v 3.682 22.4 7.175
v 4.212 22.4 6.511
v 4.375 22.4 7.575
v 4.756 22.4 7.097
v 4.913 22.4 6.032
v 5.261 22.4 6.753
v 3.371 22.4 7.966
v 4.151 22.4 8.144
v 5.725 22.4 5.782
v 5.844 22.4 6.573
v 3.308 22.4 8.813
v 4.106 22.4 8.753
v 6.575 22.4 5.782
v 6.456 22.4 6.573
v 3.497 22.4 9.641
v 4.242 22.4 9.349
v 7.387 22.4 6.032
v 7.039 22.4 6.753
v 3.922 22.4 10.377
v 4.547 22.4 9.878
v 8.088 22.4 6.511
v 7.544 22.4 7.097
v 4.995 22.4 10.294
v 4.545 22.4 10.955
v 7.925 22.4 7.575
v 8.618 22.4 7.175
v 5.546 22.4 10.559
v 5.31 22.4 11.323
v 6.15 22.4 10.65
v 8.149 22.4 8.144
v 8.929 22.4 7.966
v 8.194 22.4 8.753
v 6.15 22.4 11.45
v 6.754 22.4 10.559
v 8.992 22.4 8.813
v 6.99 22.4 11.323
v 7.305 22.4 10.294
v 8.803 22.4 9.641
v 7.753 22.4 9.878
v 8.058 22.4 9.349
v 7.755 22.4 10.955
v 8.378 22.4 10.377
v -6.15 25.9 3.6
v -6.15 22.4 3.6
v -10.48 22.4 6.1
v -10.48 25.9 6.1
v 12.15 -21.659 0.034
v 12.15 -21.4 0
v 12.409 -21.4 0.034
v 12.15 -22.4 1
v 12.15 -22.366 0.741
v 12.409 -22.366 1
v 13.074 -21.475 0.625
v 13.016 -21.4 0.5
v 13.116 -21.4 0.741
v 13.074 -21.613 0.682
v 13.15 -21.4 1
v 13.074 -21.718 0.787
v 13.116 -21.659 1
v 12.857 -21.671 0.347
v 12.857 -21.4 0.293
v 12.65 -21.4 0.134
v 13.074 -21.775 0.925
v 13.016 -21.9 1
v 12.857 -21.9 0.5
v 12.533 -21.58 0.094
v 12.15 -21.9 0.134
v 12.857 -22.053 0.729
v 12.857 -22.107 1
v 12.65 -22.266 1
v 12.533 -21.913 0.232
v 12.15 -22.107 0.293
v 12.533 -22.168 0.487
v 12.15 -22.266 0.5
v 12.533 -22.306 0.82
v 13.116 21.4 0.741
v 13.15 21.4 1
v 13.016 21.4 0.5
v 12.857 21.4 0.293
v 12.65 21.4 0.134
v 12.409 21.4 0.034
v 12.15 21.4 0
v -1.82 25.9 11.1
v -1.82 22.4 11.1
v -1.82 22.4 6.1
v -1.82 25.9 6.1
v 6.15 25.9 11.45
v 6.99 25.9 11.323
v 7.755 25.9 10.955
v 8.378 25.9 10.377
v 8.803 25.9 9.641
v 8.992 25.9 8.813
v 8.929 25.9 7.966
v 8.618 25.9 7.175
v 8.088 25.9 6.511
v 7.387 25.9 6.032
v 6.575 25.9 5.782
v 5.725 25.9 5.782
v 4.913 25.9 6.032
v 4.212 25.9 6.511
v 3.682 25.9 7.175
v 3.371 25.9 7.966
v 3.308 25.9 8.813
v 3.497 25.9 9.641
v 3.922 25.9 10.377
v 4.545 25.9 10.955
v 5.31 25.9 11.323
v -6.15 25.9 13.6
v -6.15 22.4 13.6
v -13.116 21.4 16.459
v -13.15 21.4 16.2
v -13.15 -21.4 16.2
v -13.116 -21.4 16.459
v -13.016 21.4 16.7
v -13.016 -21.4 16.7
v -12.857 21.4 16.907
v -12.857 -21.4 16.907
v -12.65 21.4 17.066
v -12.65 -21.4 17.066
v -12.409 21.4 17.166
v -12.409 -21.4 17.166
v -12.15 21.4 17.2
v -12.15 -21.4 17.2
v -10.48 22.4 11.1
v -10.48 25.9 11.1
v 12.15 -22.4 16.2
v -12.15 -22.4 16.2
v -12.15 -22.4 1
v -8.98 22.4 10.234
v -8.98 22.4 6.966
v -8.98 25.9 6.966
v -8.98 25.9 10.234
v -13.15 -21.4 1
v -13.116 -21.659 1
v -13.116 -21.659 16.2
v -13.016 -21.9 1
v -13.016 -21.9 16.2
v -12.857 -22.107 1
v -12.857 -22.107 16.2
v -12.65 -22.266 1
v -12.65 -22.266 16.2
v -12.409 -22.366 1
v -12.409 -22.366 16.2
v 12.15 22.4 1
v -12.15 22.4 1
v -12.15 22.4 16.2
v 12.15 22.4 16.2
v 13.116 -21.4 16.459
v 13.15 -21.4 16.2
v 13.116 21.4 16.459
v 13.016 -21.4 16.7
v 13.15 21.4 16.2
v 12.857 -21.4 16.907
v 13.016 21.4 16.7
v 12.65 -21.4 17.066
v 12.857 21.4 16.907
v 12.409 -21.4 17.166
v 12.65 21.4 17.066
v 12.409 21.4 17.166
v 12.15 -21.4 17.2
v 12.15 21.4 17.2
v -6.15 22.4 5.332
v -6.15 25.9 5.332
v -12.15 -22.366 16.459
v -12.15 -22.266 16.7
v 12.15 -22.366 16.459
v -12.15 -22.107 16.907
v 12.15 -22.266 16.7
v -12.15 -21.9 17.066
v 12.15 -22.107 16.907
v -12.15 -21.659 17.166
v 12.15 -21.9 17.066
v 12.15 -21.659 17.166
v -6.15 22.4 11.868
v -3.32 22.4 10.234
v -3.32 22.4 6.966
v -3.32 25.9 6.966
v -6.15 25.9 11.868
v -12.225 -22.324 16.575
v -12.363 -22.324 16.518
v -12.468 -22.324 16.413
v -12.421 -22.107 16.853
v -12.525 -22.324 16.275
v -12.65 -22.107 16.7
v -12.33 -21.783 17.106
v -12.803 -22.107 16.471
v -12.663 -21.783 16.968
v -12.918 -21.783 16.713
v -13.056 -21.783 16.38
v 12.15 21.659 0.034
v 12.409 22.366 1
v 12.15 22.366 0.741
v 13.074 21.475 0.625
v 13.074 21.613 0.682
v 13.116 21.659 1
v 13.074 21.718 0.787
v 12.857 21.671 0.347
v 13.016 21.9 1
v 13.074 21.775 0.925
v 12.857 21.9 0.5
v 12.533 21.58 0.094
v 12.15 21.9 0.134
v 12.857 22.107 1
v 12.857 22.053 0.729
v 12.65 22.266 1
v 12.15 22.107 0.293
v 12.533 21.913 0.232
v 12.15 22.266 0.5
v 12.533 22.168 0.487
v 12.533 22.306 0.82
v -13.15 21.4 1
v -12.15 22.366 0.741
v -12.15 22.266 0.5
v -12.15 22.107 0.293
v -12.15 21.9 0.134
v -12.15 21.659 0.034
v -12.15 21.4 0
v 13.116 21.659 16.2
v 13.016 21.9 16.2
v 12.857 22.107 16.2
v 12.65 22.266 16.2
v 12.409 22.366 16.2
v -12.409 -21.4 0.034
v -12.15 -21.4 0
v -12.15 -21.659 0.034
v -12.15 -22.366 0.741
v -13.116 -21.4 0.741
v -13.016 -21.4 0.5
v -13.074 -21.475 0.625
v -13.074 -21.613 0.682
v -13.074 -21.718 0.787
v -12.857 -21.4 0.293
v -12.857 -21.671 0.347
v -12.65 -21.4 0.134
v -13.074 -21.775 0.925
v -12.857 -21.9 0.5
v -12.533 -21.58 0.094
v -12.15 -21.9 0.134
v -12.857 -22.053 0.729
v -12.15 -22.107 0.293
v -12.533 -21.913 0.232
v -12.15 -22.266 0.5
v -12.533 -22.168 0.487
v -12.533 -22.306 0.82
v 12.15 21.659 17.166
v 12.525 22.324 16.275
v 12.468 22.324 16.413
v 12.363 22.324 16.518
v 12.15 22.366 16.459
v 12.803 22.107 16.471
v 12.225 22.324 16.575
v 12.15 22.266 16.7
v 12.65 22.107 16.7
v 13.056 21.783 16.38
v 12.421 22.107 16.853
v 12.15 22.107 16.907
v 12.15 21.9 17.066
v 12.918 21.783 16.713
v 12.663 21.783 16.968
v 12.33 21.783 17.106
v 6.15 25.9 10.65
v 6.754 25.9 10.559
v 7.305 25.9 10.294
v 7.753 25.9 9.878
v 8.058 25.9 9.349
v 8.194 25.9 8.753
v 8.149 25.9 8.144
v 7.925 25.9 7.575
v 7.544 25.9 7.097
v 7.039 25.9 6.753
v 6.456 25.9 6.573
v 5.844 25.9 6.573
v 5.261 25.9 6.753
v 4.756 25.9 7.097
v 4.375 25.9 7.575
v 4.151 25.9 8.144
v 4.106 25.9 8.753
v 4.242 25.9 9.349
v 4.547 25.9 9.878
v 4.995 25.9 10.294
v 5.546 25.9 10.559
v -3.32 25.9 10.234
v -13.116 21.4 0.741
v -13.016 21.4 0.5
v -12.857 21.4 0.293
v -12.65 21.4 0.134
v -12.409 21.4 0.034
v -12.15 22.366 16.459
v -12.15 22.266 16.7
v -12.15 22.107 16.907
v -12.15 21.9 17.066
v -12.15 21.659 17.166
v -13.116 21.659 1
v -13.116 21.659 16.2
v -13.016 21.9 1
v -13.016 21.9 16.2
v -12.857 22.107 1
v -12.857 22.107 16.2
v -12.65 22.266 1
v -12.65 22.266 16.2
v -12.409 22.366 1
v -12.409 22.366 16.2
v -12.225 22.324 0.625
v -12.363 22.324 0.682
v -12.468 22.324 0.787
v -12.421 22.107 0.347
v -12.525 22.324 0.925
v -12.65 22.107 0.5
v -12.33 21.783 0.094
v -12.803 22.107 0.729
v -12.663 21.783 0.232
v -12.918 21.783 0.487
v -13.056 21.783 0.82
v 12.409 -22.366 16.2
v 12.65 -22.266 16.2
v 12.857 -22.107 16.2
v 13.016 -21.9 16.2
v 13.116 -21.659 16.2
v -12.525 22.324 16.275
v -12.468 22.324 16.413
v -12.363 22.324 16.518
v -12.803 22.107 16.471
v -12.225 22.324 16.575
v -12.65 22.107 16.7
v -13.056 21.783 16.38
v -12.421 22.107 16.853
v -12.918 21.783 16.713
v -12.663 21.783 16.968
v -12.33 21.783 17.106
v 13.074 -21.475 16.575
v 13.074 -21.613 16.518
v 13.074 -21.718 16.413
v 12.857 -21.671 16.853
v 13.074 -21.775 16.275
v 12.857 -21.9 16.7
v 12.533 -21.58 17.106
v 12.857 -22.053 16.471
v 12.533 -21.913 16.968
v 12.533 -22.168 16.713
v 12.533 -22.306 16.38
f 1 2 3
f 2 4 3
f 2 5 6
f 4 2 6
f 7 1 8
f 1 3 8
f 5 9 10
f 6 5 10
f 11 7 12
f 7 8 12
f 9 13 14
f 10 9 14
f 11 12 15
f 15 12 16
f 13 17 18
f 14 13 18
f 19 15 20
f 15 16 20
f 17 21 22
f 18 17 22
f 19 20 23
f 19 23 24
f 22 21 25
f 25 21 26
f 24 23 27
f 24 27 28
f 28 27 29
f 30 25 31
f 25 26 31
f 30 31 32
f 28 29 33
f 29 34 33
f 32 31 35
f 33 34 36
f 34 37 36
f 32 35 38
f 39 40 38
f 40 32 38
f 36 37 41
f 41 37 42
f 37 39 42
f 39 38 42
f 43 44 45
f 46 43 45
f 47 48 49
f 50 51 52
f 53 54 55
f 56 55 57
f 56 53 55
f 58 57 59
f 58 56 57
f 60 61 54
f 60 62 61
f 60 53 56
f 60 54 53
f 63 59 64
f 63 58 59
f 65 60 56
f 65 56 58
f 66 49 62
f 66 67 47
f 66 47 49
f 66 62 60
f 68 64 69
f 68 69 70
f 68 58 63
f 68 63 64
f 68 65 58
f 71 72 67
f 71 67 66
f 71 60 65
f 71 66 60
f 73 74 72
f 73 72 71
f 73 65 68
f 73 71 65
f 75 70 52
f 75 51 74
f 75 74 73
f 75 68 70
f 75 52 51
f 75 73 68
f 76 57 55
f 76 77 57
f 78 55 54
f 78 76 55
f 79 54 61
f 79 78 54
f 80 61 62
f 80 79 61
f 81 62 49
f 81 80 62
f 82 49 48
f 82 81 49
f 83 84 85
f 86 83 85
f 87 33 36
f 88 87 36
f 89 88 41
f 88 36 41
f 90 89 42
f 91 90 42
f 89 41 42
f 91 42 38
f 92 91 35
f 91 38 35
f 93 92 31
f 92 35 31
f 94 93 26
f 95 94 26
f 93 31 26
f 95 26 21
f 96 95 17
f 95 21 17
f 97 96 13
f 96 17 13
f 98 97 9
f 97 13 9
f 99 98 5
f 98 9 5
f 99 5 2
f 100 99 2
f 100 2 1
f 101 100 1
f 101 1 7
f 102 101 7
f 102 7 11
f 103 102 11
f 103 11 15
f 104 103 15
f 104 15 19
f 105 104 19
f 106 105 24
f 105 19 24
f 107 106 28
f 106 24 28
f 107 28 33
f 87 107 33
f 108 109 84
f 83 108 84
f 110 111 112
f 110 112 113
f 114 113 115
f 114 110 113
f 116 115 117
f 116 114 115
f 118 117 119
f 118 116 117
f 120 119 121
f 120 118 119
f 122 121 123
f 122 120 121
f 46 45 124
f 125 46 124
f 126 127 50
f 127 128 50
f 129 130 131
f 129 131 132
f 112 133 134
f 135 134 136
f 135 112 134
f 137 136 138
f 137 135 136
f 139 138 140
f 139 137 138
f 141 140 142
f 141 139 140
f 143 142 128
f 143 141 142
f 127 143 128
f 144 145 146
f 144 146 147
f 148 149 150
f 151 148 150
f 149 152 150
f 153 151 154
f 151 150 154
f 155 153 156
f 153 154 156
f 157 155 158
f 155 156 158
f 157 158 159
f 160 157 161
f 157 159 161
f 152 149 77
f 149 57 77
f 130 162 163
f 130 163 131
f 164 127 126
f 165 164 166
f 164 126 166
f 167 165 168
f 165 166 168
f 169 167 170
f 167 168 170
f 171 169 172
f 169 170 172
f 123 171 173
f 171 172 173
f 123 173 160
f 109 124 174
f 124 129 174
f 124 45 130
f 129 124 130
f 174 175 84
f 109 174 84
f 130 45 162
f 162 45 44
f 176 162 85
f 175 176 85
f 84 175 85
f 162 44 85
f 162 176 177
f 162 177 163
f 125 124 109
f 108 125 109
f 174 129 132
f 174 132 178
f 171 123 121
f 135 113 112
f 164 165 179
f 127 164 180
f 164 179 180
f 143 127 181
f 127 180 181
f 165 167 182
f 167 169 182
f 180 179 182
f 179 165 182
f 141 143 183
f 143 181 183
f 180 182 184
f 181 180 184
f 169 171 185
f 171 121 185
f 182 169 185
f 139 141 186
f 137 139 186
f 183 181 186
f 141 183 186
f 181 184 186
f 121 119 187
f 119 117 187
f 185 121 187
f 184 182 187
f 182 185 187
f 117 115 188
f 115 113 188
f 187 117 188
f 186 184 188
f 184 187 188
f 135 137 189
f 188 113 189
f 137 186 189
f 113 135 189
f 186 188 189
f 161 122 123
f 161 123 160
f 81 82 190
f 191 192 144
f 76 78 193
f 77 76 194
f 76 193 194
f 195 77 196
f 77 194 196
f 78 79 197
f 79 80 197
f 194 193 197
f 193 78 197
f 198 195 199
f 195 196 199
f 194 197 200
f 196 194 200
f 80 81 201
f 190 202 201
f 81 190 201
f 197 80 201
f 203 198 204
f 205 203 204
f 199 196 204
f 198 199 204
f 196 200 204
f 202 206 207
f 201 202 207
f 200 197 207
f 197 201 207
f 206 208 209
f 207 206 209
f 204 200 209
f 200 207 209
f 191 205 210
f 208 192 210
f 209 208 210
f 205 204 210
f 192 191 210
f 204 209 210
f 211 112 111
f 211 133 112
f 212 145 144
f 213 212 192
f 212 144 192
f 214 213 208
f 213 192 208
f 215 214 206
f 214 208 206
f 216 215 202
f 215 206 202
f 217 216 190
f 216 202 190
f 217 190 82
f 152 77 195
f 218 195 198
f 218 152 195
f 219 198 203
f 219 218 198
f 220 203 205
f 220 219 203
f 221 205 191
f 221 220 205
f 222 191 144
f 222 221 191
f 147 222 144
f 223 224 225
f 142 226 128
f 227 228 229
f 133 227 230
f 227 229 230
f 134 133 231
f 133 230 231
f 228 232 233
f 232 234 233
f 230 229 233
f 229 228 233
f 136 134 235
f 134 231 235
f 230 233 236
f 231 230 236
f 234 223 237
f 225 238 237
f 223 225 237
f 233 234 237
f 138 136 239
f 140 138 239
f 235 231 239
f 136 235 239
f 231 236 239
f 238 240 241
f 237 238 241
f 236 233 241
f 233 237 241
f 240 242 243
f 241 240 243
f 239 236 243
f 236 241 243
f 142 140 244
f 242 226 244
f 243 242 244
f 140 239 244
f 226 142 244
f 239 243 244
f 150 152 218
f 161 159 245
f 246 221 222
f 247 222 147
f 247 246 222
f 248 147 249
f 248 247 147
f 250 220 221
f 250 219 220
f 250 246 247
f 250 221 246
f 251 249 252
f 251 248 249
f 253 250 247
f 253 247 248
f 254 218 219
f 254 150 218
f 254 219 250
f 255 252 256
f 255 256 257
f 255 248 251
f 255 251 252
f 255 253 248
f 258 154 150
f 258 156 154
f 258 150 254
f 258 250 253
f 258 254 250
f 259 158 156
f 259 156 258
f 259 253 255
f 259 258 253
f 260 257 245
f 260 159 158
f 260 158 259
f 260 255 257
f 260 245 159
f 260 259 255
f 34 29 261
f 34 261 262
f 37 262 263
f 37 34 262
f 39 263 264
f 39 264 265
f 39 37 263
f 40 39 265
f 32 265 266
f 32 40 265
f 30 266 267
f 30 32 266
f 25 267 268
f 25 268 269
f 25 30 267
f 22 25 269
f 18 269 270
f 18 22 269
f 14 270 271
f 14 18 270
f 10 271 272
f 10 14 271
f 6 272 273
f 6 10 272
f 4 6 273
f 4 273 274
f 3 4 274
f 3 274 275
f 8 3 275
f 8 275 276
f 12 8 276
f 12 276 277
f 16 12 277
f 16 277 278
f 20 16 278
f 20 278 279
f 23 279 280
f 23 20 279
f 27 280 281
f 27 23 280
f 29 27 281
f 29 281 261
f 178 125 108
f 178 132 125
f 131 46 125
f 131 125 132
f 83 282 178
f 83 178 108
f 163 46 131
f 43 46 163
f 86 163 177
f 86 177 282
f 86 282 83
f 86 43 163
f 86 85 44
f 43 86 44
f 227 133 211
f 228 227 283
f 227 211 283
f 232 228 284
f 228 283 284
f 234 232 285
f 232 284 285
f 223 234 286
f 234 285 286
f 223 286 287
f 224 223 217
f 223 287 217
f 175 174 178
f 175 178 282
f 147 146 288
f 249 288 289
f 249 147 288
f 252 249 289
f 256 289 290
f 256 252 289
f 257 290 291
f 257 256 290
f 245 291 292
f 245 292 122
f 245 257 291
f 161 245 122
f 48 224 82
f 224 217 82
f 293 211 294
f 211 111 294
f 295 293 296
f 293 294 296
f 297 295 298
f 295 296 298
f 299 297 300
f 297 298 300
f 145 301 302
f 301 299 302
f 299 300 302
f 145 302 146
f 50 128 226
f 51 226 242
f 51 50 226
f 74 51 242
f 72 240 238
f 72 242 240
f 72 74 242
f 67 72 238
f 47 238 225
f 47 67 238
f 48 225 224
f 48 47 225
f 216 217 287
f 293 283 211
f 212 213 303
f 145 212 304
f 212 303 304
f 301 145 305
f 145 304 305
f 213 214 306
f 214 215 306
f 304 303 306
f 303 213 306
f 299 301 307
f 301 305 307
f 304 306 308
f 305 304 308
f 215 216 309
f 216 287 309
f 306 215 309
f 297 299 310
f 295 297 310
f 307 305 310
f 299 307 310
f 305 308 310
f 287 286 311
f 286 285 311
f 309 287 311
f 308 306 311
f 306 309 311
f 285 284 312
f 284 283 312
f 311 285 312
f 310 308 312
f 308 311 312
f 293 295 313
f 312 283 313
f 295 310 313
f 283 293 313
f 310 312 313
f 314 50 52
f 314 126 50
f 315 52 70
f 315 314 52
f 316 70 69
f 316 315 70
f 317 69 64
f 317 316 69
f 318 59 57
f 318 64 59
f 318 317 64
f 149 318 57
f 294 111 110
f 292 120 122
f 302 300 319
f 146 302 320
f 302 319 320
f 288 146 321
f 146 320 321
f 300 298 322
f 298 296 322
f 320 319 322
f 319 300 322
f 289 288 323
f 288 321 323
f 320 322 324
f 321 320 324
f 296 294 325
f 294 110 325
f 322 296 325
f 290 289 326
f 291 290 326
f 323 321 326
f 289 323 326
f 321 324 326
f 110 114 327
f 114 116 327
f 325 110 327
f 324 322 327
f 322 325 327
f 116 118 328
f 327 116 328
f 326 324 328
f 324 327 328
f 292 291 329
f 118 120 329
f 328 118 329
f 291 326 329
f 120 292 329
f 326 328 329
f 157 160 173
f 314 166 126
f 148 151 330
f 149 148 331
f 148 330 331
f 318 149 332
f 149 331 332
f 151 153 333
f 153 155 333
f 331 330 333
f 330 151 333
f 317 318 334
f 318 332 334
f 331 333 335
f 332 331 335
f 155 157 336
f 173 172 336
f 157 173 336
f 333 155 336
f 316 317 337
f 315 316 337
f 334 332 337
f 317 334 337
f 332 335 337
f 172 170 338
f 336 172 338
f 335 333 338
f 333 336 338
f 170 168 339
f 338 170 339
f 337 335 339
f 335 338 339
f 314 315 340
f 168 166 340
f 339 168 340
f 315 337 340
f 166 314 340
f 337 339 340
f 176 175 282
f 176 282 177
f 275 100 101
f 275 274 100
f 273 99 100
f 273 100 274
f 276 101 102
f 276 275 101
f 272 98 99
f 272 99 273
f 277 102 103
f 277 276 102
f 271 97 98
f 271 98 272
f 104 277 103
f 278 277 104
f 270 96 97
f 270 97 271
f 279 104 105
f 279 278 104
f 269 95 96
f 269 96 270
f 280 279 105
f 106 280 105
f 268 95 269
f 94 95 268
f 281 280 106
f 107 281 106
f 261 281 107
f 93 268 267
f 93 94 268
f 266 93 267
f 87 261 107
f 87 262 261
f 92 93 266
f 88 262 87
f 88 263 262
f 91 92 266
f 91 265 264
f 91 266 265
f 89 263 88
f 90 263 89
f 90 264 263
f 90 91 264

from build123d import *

# Parameters (mm, degrees)
CROQUIS1_W                = 26.3
CROQUIS1_H                = 44.8
SALIENTE_EXTRUIR1_DEPTH   = 17.2
REDONDEO1_R               = 1
CROQUIS3_R                = 2.85
CROQUIS3_R_2              = 2.05
SALIENTE_EXTRUIR2_DEPTH   = 3.5
SALIENTE_EXTRUIR2_2_DEPTH = 3.5


with BuildPart() as part:
    # Croquis1 → Saliente-Extruir1 (new body)
    with BuildSketch(Plane.XY):
        Rectangle(CROQUIS1_W, CROQUIS1_H)
    extrude(amount=SALIENTE_EXTRUIR1_DEPTH)

    # Redondeo1
    redondeo1_edges = [part.edges().sort_by_distance(p)[0] for p in [
        (-13.15, 0, 17.2),
        (0, -22.4, 17.2),
        (13.15, 0, 17.2),
        (0, -22.4, 0),
        (-13.15, 0, 0),
        (0, 22.4, 0),
        (13.15, 0, 0),
        (13.15, -22.4, 8.6),
        (-13.15, -22.4, 8.6),
        (-13.15, 22.4, 8.6),
        (13.15, 22.4, 8.6),
        (0, 22.4, 17.2),
    ]]
    fillet(redondeo1_edges, radius=REDONDEO1_R)


with BuildPart() as body_2:
    # Croquis3 → Saliente-Extruir2 (new body)
    with BuildSketch(Plane(origin=(0, 22.4, 0), x_dir=(1, 0, 0), z_dir=(0, 1, 0))):
        with Locations(Location((6.15, -8.6, 0), (0, 0, 270))):
            Circle(CROQUIS3_R)
        with Locations(Location((6.15, -8.6, 0), (0, 0, 270))):
            Circle(CROQUIS3_R_2, mode=Mode.SUBTRACT)
    extrude(amount=SALIENTE_EXTRUIR2_DEPTH)


with BuildPart() as body_3:
    # Croquis3 → Saliente-Extruir2 2 (new body)
    with BuildSketch(Plane(origin=(0, 22.4, 0), x_dir=(1, 0, 0), z_dir=(0, 1, 0))):
        Polygon((-1.819872981, -11.1), (-1.819872981, -6.1), (-6.15, -3.6), (-10.480127019, -6.1), (-10.480127019, -11.1), (-6.15, -13.6), align=None)
        Polygon((-3.319872981, -6.966025404), (-6.15, -5.332050808), (-8.980127019, -6.966025404), (-8.980127019, -10.233974596), (-6.15, -11.867949192), (-3.319872981, -10.233974596), align=None, mode=Mode.SUBTRACT)
    extrude(amount=SALIENTE_EXTRUIR2_2_DEPTH)


solid = Compound([part.part, body_2.part, body_3.part])
